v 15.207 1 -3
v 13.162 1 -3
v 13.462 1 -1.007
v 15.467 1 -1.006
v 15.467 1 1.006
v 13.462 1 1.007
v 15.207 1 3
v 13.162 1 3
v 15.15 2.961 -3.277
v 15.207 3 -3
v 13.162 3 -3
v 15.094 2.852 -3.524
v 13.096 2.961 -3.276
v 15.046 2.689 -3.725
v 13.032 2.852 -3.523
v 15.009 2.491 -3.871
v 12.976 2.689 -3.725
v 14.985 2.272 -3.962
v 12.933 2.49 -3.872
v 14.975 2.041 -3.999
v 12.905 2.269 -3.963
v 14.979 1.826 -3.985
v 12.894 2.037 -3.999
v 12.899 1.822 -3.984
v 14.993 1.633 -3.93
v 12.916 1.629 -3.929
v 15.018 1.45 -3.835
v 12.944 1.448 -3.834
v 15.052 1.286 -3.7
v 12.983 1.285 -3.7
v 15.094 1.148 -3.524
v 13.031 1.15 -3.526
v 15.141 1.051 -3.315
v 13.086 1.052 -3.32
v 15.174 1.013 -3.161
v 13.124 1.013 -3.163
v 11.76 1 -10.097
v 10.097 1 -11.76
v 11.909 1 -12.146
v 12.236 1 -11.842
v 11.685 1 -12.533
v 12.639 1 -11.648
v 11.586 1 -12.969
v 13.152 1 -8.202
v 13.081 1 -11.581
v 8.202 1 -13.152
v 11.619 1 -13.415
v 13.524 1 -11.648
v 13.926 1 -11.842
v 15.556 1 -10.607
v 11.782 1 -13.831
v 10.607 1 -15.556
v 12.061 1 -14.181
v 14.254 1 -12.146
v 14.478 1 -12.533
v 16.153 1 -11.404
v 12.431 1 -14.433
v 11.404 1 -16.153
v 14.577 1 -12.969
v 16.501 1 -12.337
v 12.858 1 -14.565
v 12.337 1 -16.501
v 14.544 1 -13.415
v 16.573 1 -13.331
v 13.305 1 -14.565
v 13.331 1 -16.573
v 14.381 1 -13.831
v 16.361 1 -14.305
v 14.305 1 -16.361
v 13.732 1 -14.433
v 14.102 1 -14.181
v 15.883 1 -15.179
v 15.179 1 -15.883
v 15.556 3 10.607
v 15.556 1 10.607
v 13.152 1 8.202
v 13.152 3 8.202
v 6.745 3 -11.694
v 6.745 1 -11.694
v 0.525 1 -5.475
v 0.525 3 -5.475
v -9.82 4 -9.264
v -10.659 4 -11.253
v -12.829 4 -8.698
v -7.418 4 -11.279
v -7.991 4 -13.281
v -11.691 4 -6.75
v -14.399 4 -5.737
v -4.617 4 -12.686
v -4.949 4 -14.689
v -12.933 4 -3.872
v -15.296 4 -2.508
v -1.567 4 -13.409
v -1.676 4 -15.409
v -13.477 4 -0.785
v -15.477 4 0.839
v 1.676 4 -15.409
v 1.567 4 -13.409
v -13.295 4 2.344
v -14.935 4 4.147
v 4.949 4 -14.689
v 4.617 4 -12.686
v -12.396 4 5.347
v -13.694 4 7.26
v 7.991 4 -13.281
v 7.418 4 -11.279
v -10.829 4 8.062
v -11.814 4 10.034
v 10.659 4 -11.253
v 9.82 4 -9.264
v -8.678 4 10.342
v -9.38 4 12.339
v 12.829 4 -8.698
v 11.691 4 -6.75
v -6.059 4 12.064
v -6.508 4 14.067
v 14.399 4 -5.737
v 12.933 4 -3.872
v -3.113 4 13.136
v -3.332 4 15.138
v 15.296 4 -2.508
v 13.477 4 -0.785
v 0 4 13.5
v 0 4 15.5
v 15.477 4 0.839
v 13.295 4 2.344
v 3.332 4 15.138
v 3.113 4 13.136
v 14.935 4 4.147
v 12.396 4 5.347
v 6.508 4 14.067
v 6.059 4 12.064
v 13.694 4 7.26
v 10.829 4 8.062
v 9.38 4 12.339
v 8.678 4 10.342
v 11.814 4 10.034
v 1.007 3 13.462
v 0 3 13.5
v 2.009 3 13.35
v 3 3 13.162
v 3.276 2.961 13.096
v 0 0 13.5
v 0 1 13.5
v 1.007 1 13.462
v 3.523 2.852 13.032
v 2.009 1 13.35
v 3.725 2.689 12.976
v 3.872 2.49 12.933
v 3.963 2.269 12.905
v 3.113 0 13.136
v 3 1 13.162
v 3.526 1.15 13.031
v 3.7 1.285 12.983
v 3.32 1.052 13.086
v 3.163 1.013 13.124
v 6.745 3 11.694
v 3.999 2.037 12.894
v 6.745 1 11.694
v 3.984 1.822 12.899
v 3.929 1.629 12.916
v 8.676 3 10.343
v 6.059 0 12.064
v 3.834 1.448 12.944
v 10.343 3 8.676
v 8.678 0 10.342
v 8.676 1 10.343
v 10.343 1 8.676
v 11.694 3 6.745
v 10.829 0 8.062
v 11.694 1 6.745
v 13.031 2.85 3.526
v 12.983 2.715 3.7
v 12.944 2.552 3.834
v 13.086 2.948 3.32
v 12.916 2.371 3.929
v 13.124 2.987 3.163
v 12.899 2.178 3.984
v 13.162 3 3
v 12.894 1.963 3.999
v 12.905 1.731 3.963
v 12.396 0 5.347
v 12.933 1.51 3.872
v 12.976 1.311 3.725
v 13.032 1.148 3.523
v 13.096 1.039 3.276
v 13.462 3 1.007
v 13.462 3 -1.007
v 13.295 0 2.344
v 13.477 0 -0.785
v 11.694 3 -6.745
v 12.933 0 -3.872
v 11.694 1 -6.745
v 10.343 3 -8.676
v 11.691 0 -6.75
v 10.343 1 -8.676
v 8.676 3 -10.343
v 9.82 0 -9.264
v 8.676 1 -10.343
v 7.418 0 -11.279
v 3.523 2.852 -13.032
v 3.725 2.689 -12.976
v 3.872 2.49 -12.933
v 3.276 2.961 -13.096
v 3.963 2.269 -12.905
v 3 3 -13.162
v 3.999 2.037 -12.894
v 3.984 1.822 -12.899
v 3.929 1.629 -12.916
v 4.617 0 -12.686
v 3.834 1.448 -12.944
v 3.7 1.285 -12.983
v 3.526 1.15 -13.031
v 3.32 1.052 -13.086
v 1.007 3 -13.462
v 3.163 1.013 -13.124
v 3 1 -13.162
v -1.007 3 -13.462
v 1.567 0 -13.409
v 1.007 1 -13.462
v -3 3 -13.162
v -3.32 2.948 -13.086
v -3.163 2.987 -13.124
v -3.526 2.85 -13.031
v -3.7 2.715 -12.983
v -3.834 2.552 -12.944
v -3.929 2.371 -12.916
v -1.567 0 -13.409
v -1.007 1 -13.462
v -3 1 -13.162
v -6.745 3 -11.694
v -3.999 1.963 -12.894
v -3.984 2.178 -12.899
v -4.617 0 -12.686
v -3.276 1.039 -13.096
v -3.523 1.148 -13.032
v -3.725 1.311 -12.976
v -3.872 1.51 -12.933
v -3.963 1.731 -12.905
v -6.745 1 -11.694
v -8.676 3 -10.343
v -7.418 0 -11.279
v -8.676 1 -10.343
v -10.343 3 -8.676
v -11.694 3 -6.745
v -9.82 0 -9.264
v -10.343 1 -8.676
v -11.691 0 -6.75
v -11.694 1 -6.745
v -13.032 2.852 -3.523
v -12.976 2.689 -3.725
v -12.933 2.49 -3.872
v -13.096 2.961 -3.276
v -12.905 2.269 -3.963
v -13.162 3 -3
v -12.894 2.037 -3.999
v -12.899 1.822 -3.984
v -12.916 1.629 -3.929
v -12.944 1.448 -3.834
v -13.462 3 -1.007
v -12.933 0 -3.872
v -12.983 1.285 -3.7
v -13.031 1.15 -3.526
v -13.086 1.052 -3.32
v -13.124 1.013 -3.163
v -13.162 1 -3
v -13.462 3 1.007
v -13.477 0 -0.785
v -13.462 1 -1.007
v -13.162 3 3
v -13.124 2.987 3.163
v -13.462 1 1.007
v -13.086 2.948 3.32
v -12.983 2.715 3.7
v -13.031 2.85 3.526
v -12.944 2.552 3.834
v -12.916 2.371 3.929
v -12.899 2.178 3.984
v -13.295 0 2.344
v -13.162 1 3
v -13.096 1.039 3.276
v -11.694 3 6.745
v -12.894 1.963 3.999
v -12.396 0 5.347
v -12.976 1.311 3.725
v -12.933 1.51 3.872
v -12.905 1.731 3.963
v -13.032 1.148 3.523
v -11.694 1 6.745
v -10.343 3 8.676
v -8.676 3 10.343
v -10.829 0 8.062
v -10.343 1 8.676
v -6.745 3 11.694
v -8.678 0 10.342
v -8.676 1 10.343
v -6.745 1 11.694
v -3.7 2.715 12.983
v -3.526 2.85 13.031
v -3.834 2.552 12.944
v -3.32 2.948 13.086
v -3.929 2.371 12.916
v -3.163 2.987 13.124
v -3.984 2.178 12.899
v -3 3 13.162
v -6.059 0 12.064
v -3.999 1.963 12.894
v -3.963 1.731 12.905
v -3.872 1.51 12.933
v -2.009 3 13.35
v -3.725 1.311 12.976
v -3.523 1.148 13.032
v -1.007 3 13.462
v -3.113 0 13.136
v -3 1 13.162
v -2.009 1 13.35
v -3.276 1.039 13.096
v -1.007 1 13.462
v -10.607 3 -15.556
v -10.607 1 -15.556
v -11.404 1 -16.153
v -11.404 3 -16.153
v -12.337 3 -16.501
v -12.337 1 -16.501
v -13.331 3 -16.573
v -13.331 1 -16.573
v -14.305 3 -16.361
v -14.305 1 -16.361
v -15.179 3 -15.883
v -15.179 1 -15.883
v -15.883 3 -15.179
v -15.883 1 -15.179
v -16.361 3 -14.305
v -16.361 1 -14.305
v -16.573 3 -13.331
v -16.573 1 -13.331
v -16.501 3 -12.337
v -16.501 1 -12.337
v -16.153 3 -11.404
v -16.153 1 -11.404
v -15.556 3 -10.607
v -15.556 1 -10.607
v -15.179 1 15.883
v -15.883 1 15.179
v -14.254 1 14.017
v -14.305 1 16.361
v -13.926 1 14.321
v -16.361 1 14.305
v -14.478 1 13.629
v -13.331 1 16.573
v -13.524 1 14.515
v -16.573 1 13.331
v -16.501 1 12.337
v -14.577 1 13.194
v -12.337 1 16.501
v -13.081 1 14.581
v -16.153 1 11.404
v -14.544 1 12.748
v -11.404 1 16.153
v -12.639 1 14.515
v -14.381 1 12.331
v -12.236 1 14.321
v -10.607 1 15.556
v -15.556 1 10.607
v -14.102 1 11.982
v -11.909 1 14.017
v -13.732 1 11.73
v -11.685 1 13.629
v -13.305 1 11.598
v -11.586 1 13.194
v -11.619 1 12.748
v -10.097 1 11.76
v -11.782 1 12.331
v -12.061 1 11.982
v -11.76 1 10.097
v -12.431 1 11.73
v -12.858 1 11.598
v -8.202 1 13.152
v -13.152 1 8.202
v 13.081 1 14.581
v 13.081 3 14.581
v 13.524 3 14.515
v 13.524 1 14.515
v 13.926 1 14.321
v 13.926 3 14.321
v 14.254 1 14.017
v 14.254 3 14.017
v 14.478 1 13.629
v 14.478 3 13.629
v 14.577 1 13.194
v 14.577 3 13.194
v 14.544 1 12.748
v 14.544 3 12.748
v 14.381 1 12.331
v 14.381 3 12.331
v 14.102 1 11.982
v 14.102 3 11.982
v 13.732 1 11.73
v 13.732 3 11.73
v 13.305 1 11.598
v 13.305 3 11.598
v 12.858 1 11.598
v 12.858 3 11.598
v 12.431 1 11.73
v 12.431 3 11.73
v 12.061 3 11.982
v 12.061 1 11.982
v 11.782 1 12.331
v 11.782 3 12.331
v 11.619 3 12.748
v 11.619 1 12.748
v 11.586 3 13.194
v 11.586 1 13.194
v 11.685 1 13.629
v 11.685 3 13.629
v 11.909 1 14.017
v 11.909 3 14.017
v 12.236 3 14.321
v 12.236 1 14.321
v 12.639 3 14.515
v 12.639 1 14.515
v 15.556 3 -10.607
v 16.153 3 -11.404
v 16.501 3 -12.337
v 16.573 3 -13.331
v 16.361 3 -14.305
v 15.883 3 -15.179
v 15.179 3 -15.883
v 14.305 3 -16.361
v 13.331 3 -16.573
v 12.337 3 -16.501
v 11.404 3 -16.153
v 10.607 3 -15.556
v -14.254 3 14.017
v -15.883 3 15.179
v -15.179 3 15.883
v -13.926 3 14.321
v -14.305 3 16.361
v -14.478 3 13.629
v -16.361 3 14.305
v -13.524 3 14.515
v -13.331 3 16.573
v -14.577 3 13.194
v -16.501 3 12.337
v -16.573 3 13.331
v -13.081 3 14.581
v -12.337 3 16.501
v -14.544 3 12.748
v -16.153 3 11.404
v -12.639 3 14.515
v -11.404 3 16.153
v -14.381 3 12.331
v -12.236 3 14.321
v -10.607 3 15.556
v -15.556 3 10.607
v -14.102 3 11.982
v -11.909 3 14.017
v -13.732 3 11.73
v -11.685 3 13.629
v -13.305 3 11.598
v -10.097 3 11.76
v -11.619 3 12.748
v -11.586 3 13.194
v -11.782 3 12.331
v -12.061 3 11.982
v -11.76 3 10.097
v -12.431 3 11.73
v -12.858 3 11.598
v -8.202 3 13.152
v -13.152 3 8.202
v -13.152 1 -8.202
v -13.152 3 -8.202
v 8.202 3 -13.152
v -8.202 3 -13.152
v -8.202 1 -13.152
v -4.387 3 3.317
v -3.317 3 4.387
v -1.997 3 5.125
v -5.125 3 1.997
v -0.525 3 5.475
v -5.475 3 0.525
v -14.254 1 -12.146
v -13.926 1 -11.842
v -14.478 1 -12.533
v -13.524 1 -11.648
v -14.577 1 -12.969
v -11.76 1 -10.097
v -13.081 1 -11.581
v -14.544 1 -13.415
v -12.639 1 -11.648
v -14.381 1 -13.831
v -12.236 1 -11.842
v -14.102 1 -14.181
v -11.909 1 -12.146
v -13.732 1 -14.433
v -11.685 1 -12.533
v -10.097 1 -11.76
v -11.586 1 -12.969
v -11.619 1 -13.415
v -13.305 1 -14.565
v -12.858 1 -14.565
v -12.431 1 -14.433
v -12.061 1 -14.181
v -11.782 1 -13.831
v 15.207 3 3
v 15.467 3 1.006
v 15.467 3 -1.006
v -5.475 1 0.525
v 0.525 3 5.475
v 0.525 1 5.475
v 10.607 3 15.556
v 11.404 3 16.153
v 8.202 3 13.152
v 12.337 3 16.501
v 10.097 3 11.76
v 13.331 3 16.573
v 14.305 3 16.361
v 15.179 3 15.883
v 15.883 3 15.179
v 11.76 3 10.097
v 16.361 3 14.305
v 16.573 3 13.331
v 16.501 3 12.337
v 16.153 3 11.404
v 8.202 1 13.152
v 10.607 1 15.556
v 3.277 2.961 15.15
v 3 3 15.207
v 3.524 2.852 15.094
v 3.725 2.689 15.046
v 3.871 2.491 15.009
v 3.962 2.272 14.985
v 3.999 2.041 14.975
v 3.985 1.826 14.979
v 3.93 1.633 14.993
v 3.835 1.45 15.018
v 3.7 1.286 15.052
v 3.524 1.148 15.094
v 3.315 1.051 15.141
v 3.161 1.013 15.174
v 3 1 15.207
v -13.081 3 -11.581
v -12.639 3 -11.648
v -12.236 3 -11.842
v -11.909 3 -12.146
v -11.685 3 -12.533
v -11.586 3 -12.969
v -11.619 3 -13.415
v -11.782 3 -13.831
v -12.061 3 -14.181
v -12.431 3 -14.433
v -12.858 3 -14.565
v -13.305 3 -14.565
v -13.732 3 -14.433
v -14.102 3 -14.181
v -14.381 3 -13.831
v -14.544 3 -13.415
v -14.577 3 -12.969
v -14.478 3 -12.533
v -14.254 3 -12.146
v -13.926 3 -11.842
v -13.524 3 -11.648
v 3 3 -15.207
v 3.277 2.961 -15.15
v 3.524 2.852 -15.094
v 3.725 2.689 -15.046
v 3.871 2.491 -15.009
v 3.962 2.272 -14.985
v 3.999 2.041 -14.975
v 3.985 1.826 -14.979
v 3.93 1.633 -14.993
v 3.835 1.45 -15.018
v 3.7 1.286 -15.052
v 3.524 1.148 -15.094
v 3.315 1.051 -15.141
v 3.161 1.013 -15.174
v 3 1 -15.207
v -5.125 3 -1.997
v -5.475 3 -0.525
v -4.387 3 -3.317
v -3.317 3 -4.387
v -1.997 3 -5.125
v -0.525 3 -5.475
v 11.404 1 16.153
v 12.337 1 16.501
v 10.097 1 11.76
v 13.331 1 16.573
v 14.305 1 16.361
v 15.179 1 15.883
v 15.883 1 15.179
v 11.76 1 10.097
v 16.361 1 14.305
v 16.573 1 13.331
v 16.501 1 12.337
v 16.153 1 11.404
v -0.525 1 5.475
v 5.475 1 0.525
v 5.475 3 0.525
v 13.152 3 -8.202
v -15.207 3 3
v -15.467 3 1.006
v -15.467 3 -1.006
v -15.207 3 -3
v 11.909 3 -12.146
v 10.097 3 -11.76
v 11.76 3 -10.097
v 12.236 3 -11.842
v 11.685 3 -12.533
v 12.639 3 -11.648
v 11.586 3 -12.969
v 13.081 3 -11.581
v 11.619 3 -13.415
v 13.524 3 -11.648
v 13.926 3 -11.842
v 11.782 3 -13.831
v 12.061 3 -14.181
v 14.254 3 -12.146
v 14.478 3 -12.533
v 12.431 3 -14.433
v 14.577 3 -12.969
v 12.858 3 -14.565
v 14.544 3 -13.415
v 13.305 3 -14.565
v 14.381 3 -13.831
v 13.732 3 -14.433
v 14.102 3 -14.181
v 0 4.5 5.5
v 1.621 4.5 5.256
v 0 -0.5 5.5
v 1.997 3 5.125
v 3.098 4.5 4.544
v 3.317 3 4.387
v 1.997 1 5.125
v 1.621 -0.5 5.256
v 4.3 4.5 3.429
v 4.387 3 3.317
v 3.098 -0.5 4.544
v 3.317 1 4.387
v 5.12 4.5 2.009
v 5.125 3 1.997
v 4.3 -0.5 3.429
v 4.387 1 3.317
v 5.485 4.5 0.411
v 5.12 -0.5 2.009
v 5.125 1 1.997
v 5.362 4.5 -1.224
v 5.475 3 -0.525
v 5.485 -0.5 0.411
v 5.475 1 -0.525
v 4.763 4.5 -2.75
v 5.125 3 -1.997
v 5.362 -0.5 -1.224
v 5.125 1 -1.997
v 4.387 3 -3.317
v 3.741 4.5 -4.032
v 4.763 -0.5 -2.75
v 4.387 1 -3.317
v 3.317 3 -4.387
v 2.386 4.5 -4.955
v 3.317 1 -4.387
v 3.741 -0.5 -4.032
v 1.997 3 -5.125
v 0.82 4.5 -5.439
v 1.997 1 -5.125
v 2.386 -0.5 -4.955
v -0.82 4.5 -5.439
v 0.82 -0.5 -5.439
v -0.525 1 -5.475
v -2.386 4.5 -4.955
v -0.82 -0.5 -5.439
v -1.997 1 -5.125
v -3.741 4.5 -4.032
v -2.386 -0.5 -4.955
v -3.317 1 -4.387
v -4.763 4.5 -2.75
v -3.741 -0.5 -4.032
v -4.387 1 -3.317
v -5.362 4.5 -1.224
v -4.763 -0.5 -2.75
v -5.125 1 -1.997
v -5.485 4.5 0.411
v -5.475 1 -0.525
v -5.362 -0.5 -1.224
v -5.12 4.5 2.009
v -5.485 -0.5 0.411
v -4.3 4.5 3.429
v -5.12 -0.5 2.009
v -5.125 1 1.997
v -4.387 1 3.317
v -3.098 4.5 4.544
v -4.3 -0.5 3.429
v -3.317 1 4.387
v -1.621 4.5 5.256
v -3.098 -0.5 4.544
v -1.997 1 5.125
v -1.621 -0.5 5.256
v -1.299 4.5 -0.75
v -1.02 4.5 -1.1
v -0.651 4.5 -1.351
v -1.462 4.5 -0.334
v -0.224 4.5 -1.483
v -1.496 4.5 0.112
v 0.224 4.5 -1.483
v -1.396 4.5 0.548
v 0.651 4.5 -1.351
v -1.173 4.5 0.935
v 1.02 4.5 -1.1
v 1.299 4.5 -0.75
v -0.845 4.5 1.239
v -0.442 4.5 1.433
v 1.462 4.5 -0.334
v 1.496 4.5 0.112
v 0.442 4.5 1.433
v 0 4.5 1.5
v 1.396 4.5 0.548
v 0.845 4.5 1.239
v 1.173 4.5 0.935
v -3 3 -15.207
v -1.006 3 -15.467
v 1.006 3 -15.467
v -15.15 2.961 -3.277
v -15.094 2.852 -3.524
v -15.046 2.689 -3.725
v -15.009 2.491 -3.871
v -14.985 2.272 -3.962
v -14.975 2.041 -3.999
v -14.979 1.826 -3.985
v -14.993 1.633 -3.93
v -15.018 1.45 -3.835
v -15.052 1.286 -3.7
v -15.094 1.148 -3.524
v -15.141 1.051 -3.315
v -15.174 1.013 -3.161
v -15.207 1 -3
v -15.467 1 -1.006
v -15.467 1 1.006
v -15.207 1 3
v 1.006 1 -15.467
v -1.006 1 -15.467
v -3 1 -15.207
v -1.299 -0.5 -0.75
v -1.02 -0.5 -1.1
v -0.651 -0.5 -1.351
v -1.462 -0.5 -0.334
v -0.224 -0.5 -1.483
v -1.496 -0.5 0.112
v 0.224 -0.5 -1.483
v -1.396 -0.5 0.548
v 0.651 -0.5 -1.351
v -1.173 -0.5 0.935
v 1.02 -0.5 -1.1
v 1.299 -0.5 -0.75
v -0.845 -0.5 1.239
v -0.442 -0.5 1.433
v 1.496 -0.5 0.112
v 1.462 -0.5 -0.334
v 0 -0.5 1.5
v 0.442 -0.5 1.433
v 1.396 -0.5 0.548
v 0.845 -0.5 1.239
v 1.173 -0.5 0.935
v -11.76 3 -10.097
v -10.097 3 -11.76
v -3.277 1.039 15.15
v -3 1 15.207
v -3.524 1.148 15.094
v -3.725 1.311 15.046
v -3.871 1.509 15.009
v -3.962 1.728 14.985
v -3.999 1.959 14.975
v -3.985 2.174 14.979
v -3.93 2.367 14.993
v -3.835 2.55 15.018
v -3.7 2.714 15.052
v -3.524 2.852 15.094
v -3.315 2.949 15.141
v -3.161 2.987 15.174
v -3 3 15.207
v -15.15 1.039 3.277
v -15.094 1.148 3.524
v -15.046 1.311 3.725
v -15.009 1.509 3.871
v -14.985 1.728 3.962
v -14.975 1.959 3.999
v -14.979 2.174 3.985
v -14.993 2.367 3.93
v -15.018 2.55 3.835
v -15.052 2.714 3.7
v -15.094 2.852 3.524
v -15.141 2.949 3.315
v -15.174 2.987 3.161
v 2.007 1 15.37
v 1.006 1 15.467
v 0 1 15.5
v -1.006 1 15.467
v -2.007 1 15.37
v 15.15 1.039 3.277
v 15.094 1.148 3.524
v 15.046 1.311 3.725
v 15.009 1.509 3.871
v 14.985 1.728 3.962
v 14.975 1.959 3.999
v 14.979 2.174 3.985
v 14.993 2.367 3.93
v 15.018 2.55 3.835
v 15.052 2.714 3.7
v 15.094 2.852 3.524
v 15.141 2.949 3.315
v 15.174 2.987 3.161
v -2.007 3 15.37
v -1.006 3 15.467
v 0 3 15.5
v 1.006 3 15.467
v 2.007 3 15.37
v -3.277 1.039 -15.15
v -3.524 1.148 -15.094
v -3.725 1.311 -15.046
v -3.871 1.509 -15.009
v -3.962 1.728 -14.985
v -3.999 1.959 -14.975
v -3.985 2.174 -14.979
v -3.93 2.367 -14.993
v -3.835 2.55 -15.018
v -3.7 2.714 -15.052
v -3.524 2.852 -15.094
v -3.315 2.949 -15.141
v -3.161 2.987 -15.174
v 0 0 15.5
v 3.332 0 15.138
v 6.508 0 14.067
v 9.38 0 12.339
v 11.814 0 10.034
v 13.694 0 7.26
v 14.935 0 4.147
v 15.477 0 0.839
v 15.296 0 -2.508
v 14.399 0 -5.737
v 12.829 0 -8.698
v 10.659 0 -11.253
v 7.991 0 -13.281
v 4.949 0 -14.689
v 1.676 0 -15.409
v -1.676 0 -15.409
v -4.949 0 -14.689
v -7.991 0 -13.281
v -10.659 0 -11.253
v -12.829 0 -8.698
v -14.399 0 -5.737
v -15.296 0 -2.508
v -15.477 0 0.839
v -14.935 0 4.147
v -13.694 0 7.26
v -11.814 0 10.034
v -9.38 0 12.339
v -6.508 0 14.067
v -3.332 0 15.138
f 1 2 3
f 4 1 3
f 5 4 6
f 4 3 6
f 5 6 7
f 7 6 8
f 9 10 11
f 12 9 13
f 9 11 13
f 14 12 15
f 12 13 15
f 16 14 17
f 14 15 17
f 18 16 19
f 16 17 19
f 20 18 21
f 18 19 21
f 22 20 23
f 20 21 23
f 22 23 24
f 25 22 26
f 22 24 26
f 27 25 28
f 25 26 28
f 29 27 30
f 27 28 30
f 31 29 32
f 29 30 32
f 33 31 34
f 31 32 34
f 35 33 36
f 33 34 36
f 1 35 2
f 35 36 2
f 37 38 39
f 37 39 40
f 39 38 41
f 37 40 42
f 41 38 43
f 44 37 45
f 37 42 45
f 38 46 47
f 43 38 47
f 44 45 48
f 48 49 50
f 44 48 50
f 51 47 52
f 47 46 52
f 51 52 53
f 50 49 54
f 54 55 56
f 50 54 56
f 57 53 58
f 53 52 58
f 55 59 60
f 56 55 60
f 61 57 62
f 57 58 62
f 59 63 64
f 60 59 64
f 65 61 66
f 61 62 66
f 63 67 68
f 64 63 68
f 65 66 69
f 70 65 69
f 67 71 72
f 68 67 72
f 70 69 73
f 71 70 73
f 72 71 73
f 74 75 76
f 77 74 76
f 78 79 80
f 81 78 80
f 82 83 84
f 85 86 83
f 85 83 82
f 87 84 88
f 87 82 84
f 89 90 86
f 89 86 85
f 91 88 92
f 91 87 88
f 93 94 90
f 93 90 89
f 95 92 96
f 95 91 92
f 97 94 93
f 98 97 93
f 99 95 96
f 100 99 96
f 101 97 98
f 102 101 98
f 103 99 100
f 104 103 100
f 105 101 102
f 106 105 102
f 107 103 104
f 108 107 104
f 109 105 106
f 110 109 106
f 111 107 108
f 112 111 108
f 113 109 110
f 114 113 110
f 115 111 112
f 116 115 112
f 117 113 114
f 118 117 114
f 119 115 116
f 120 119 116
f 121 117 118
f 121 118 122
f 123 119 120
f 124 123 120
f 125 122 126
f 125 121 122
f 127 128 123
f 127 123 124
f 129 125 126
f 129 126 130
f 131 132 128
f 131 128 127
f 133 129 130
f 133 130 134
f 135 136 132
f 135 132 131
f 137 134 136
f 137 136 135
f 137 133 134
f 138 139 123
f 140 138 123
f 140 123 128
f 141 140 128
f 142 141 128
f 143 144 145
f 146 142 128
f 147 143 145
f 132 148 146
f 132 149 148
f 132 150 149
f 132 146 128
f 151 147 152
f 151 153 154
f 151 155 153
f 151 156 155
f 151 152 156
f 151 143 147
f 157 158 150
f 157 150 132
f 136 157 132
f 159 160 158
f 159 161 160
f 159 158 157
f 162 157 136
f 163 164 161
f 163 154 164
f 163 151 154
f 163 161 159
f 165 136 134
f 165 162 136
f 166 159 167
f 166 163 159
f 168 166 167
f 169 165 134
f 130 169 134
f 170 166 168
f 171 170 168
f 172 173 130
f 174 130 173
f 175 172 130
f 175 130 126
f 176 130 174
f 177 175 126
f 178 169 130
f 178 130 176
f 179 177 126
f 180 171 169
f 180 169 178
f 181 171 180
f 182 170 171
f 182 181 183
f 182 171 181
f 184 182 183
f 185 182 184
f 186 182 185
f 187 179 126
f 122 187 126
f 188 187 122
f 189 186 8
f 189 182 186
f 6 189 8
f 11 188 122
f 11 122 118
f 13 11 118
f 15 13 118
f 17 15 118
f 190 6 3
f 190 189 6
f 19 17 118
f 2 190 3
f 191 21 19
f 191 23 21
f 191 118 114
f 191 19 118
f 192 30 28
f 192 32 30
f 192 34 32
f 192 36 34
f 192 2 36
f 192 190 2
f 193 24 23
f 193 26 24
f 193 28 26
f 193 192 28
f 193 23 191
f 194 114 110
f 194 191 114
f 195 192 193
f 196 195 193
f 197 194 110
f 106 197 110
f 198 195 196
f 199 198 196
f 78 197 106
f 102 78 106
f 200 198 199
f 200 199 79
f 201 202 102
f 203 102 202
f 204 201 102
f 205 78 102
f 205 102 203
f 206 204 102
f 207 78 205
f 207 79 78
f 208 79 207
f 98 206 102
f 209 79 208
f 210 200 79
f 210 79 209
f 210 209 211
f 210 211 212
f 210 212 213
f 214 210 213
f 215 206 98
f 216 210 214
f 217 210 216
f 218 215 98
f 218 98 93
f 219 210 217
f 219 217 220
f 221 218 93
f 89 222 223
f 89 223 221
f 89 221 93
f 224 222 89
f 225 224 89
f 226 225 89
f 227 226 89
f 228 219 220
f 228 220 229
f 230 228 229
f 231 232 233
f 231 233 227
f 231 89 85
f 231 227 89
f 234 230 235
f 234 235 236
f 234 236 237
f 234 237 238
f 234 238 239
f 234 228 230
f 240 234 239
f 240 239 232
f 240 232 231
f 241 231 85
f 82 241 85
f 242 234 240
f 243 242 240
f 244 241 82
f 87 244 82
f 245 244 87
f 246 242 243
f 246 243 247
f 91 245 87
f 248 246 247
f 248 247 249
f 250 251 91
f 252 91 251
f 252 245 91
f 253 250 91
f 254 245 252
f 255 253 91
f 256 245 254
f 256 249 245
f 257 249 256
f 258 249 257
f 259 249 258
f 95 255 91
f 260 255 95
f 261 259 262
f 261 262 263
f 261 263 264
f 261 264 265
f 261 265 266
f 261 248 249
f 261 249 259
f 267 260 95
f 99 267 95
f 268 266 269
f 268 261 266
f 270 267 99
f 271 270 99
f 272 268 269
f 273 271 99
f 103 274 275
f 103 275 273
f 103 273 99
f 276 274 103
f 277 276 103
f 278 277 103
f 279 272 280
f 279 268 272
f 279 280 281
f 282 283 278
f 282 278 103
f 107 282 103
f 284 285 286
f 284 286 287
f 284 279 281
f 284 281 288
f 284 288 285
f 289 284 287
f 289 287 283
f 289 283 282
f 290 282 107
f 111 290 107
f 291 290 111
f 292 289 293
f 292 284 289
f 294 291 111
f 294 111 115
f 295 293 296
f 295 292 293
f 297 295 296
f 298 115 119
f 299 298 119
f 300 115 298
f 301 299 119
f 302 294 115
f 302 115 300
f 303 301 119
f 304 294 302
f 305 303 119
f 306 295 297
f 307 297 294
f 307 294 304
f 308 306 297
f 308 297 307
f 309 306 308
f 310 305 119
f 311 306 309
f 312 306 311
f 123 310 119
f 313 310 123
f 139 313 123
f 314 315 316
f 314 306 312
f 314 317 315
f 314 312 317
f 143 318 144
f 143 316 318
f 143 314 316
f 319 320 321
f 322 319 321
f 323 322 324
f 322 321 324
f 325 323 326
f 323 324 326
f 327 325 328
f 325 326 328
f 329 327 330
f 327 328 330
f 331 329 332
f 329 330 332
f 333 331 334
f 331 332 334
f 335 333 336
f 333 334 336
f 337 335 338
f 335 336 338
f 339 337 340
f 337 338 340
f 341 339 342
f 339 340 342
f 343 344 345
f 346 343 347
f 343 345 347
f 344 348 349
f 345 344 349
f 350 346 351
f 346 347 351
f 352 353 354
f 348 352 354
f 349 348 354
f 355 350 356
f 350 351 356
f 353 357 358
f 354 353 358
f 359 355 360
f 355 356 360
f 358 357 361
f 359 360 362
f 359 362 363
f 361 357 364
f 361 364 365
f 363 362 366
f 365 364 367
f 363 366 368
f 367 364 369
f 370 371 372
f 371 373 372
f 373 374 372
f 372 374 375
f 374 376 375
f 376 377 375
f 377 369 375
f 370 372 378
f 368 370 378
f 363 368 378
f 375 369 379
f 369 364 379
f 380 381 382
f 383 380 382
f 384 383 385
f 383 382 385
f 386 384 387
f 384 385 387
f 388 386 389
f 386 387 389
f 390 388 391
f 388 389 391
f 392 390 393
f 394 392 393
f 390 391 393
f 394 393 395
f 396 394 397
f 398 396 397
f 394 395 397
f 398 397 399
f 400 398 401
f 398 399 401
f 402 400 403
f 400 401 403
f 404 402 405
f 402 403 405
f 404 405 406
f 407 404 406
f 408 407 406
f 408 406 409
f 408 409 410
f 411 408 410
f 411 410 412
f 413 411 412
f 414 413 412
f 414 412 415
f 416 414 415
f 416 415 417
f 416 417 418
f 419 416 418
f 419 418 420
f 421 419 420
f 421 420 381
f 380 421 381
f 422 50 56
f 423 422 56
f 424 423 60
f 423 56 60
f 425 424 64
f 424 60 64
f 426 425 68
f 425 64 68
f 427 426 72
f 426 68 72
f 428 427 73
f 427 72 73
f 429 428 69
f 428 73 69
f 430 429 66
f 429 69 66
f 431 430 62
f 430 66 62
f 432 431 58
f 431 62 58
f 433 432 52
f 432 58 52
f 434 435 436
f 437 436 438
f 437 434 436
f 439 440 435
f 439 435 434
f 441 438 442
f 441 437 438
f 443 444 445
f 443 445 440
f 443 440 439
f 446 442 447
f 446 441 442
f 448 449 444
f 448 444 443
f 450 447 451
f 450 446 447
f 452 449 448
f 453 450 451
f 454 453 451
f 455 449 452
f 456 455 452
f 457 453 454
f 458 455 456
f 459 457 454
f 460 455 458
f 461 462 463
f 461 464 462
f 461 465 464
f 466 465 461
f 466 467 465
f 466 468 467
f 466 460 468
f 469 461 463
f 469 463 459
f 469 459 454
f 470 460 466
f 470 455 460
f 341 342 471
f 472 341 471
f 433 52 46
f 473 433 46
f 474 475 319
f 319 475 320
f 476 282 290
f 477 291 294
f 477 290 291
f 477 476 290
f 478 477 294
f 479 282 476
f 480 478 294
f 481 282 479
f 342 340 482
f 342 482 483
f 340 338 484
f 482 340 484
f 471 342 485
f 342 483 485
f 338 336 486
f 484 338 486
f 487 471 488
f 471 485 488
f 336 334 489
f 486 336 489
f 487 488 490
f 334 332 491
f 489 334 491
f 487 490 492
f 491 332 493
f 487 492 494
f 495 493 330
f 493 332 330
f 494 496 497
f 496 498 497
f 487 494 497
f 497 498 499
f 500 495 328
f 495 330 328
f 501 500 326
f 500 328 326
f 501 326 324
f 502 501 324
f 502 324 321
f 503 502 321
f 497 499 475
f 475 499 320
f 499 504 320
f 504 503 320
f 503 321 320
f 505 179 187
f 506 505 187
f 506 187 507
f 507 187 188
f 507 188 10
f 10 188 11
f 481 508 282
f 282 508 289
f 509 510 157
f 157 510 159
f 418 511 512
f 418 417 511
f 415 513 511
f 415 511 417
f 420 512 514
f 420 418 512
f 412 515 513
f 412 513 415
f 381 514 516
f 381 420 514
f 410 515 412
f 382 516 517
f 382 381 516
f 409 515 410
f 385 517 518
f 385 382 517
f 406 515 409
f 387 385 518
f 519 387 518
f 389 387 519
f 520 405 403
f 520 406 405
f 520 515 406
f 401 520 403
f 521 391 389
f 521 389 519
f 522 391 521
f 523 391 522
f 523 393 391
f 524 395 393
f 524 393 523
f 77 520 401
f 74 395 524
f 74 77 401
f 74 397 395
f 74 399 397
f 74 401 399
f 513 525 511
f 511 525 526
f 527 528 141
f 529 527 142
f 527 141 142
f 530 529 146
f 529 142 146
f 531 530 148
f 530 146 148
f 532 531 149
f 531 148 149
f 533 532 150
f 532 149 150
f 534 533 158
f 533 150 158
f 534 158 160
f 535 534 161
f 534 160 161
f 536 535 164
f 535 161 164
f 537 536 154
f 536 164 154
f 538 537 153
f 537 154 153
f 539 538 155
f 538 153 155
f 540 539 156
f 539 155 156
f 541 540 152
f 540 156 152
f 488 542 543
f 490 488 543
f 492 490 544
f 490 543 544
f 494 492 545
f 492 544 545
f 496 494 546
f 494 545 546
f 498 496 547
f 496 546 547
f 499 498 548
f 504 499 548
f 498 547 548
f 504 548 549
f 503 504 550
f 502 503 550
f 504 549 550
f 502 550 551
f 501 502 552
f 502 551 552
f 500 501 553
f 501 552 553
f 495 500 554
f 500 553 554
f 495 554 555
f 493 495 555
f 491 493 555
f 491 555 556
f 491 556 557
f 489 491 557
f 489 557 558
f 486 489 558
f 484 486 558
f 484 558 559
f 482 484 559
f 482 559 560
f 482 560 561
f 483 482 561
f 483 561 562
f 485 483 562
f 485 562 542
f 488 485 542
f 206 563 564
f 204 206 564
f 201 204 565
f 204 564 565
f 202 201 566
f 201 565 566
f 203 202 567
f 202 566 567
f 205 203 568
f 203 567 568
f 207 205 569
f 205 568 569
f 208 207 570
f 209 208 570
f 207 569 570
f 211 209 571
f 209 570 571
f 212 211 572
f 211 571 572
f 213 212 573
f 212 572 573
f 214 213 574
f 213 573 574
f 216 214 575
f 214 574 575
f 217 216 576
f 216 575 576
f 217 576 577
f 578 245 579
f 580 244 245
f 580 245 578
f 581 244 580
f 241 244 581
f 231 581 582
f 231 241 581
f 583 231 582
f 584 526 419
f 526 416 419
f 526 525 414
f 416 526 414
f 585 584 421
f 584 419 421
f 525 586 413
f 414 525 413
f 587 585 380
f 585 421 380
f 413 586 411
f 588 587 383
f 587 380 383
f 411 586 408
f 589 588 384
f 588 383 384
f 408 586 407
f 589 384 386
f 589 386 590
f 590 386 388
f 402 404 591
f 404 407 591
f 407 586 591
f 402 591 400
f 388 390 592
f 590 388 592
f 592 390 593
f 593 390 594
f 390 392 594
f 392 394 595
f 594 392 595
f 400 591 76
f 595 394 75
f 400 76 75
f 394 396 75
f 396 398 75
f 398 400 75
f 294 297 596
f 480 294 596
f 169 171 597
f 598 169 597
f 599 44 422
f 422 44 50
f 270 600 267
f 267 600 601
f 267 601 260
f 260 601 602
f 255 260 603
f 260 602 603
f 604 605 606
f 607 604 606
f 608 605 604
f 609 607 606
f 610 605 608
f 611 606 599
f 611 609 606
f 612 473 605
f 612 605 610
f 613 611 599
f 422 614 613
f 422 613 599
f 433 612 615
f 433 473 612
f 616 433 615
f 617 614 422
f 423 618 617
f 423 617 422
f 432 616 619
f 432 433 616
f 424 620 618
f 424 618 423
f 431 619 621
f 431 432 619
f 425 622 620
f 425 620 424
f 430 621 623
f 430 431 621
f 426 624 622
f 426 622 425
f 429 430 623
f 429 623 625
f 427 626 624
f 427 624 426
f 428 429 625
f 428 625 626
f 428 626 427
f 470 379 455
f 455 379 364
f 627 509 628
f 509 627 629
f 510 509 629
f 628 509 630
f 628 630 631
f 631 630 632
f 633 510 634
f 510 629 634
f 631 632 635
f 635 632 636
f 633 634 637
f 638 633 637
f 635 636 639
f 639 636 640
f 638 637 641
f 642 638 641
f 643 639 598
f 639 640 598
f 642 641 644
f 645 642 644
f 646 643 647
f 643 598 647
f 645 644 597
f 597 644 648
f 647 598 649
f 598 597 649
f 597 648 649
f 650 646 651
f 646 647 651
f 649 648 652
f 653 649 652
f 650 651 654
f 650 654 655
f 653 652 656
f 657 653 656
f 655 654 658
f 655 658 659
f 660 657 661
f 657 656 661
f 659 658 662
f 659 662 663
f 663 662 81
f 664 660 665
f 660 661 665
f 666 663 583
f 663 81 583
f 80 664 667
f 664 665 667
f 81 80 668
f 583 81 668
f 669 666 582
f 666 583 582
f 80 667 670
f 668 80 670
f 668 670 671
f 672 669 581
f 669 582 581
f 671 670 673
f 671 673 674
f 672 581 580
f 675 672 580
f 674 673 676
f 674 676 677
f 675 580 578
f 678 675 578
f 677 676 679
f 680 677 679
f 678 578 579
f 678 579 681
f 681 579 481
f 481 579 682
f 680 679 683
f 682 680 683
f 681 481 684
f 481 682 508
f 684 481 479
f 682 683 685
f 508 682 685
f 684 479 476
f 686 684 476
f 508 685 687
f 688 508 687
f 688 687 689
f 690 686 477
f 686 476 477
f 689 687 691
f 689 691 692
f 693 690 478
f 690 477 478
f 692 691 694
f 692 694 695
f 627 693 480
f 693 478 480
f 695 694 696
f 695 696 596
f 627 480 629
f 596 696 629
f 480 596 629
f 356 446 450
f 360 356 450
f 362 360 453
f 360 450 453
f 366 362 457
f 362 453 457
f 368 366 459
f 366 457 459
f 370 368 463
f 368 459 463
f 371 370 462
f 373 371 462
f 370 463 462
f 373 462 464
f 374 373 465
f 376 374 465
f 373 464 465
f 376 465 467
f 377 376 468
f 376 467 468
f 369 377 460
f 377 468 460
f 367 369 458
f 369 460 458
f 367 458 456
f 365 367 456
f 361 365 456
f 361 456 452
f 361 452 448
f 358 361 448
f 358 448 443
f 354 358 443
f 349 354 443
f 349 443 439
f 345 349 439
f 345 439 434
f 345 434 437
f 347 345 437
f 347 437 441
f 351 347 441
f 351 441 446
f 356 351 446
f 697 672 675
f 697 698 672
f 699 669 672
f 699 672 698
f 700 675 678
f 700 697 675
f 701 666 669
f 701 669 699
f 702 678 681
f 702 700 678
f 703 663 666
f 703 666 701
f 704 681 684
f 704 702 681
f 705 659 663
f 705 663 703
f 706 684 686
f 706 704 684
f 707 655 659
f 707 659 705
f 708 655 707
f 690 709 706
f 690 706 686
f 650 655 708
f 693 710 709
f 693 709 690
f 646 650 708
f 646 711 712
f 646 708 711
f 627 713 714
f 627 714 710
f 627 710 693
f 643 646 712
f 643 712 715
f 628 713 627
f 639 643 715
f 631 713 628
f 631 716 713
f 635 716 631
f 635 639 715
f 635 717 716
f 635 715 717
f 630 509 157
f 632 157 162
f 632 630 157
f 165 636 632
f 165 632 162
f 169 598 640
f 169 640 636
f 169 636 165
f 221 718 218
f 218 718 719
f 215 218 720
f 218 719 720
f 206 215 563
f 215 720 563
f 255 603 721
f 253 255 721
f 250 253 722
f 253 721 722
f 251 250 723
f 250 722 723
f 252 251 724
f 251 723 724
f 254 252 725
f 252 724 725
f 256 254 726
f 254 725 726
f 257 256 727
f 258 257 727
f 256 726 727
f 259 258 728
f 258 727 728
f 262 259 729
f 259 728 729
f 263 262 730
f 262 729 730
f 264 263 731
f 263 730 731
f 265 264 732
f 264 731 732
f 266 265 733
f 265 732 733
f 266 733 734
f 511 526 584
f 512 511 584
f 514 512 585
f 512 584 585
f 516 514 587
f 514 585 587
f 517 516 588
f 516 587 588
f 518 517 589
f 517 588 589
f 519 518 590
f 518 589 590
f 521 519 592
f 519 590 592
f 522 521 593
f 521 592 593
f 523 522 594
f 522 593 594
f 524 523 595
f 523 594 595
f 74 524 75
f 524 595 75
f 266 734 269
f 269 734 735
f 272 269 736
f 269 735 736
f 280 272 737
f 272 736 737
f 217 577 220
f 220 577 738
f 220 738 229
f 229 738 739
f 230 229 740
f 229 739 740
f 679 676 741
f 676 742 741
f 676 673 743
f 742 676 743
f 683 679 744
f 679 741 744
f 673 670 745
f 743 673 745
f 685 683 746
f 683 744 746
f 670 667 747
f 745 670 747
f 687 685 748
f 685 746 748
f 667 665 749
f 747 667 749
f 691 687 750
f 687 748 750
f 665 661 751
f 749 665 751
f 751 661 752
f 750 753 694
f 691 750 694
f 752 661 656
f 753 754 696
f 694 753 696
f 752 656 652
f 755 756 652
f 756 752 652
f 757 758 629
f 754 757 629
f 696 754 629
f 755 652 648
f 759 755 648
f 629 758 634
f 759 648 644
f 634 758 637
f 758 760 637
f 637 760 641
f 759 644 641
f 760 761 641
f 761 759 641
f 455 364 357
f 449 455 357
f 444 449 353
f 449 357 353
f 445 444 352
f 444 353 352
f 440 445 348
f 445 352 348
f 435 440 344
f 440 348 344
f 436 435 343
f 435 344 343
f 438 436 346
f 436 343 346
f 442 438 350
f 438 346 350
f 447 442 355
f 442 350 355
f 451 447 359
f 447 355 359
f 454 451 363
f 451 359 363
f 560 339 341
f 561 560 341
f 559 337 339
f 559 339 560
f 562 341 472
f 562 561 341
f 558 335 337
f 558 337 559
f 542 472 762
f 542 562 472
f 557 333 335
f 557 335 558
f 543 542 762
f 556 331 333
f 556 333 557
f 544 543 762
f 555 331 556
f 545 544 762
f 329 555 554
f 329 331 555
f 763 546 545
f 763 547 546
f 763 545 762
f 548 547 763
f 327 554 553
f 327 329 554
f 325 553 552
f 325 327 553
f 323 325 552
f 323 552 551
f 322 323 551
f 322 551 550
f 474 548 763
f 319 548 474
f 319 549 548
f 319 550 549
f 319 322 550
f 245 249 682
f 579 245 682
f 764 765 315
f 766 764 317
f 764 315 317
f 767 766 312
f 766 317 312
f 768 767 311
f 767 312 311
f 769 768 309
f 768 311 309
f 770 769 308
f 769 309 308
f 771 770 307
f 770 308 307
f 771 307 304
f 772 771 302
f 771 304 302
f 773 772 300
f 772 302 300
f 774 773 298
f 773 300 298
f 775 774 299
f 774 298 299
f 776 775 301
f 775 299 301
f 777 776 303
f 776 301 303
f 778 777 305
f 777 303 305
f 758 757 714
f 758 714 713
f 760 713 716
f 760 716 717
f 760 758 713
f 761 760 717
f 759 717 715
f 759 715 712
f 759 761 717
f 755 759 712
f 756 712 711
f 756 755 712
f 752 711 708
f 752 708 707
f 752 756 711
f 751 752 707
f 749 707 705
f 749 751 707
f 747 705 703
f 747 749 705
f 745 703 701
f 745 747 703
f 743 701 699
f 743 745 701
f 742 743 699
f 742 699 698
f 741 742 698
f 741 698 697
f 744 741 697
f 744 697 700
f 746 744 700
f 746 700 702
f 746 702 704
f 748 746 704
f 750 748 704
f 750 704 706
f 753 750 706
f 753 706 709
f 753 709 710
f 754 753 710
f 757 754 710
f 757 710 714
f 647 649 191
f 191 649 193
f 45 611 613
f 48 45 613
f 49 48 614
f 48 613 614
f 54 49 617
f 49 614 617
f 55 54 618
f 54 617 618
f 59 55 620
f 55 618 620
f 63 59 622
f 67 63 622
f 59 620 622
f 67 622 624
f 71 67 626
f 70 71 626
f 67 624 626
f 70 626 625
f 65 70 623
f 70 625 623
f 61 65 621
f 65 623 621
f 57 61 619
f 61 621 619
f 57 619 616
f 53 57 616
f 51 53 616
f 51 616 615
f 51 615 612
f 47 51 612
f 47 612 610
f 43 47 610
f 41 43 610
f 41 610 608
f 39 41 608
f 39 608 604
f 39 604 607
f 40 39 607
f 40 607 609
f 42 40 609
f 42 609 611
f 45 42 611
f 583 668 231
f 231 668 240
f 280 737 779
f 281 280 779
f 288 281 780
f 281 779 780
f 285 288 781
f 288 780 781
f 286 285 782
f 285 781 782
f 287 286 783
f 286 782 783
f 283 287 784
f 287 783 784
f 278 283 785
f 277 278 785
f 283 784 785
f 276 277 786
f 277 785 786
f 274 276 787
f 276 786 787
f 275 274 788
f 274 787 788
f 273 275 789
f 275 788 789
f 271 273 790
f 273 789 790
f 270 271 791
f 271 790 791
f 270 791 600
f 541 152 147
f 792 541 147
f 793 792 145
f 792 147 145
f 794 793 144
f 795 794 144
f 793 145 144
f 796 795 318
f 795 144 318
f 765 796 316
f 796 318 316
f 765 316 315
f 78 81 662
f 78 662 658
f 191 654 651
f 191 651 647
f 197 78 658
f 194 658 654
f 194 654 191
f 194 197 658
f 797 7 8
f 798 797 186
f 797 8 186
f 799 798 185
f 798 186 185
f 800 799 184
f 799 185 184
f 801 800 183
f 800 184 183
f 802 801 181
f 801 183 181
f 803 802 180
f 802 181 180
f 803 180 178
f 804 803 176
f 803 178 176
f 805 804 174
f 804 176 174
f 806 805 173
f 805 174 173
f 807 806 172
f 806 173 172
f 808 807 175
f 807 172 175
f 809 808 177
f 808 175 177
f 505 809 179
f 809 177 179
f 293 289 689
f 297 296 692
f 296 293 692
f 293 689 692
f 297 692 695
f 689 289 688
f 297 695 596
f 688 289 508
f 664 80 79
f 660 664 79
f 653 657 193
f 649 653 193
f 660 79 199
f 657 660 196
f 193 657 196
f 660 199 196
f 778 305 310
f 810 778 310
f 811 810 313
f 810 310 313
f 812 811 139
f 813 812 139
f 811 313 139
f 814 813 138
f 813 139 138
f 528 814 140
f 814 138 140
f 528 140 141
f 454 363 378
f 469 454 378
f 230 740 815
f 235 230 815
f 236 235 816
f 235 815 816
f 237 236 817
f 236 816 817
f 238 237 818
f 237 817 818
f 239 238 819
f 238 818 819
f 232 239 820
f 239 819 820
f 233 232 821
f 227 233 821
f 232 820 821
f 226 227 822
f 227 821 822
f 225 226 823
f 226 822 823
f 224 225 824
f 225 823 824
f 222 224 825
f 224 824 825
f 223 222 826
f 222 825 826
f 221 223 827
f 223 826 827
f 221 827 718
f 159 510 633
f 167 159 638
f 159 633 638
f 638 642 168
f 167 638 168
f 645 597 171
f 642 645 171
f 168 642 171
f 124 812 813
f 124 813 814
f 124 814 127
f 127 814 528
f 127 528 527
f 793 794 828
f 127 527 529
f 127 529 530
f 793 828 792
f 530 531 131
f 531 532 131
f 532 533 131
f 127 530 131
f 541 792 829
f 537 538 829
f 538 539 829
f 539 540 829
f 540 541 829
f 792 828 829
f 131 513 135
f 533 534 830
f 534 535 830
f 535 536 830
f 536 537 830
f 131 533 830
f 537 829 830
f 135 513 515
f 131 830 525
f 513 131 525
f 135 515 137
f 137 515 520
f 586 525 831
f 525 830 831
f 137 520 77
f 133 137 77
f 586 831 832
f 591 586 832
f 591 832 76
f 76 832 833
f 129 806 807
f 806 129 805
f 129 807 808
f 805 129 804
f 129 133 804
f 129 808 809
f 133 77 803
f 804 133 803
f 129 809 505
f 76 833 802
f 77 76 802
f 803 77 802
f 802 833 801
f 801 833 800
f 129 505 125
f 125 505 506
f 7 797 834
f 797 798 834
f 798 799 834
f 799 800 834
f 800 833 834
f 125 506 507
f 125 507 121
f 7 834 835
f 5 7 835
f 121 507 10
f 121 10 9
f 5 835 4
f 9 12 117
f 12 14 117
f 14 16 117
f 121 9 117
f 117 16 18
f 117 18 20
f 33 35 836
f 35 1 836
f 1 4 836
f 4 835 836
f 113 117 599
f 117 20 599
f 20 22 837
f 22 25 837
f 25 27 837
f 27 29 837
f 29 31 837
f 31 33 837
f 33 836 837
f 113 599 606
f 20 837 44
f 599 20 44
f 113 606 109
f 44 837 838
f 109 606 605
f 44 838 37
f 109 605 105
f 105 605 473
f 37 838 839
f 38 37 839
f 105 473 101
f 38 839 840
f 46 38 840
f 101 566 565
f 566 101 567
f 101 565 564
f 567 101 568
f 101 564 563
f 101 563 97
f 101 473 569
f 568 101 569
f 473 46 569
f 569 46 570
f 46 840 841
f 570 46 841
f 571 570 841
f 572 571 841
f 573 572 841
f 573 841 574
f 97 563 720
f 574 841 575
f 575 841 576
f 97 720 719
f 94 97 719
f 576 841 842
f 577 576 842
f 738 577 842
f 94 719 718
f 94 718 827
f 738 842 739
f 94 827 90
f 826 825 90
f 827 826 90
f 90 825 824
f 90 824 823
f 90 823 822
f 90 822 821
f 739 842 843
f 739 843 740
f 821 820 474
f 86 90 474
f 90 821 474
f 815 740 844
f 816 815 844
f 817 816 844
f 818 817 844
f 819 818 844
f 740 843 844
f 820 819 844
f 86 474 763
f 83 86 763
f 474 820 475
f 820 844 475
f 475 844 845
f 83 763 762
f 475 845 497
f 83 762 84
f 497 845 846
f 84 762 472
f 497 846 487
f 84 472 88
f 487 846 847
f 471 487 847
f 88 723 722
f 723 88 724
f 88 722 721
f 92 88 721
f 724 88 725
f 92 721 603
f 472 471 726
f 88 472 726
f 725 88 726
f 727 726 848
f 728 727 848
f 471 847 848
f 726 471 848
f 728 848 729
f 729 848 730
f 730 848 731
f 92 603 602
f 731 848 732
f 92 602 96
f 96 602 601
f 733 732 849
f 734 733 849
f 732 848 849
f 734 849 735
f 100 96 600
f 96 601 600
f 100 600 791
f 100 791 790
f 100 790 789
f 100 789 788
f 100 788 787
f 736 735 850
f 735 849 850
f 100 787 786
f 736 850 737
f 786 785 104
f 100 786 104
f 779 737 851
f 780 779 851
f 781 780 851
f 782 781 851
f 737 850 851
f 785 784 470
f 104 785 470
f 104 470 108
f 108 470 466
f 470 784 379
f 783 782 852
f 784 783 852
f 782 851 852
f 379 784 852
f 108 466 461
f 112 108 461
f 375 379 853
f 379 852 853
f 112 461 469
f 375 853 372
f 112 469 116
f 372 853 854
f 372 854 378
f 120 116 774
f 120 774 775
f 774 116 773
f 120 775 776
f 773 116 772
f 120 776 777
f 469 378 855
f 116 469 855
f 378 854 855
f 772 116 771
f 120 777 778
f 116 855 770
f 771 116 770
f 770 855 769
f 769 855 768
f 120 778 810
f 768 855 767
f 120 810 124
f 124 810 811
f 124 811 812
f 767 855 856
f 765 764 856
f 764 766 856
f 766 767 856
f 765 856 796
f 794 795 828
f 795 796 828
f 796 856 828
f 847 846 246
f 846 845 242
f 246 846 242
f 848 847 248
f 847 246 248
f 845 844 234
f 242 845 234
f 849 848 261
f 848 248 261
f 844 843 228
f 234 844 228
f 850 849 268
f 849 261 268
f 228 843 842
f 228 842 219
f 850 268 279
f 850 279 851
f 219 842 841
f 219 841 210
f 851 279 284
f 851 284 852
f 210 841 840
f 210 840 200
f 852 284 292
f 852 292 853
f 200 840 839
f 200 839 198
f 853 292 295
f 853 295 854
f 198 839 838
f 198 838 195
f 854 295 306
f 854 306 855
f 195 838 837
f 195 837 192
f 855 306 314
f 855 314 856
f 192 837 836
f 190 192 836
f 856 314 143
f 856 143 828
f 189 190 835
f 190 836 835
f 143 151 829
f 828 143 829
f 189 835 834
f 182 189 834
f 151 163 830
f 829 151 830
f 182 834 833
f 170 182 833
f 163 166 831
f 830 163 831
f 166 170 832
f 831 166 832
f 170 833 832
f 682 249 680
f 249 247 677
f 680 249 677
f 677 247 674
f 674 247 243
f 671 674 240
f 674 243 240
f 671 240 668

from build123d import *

# Parameters (mm, degrees)
SKETCH1_R                = 15.5
SKETCH1_R_2              = 13.5
BOSS_EXTRUDE1_DEPTH      = 4
CUT_EXTRUDE1_DEPTH       = 44
CUT_EXTRUDE1_DEPTH_BACK  = 44
CUT_EXTRUDE2_DEPTH       = 44
CUT_EXTRUDE2_DEPTH_BACK  = 44
BOSS_EXTRUDE2_DEPTH      = 1
BOSS_EXTRUDE2_DEPTH_BACK = 1
SKETCH5_R                = 1.5
CUT_EXTRUDE3_DEPTH       = 3
BOSS_EXTRUDE3_DEPTH      = 1.5
BOSS_EXTRUDE3_DEPTH_BACK = 3.5
SKETCH6_R                = 5.5
SKETCH6_R_2              = 1.5
SKETCH7_R                = 1.5
CUT_EXTRUDE4_DEPTH       = 11.5


with BuildPart() as part:
    # Sketch1 → Boss-Extrude1 (new body)
    with BuildSketch(Plane(origin=(0, 0, 0), x_dir=(1, 0, 0), z_dir=(0, 1, 0))):
        Circle(SKETCH1_R)
        Circle(SKETCH1_R_2, mode=Mode.SUBTRACT)
    extrude(amount=BOSS_EXTRUDE1_DEPTH)

    # Sketch2 → Cut-Extrude1 (cut, two sides: drawn at the far end of the back side and taken through both)
    with BuildSketch(Plane.XY.offset(-CUT_EXTRUDE1_DEPTH_BACK)):
        with BuildLine():
            Line((-3, 3), (3, 3))
            ThreePointArc((3, 3), (4, 2), (3, 1))
            Line((3, 1), (-3, 1))
            ThreePointArc((-3, 1), (-4, 2), (-3, 3))
        make_face()
    extrude(amount=CUT_EXTRUDE1_DEPTH + CUT_EXTRUDE1_DEPTH_BACK, mode=Mode.SUBTRACT)

    # Sketch3 → Cut-Extrude2 (cut, two sides: drawn at the far end of the back side and taken through both)
    with BuildSketch(Plane(origin=(0, 0, 0), x_dir=(0, 0, -1), z_dir=(1, 0, 0)).offset(-CUT_EXTRUDE2_DEPTH_BACK)):
        with BuildLine():
            Line((-3, 3), (3, 3))
            ThreePointArc((3, 3), (4, 2), (3, 1))
            Line((3, 1), (-3, 1))
            ThreePointArc((-3, 1), (-4, 2), (-3, 3))
        make_face()
    extrude(amount=CUT_EXTRUDE2_DEPTH + CUT_EXTRUDE2_DEPTH_BACK, mode=Mode.SUBTRACT)

    # Sketch4 → Boss-Extrude2 (add, two sides: drawn at the far end of the back side and taken through both)
    with BuildSketch(Plane(origin=(0, 2, 0), x_dir=(1, 0, 0), z_dir=(0, 1, 0)).offset(-BOSS_EXTRUDE2_DEPTH_BACK)):
        with BuildLine():
            Line((0, 4.949747468), (-10.606601718, 15.556349186))
            ThreePointArc((-10.606601718, 15.556349186), (-15.556349186, 15.556349186), (-15.556349186, 10.606601718))
            Line((-15.556349186, 10.606601718), (-4.949747468, 0))
            Line((-4.949747468, 0), (-15.556349186, -10.606601718))
            ThreePointArc((-15.556349186, -10.606601718), (-15.556349186, -15.556349186), (-10.606601718, -15.556349186))
            Line((-10.606601718, -15.556349186), (0, -4.949747468))
            Line((0, -4.949747468), (10.606601718, -15.556349186))
            ThreePointArc((10.606601718, -15.556349186), (15.556349186, -15.556349186), (15.556349186, -10.606601718))
            Line((15.556349186, -10.606601718), (4.949747468, 0))
            Line((4.949747468, 0), (15.556349186, 10.606601718))
            ThreePointArc((15.556349186, 10.606601718), (15.556349186, 15.556349186), (10.606601718, 15.556349186))
            Line((10.606601718, 15.556349186), (0, 4.949747468))
        make_face()
    extrude(amount=BOSS_EXTRUDE2_DEPTH + BOSS_EXTRUDE2_DEPTH_BACK)

    # Sketch5 → Cut-Extrude3 (cut)
    with BuildSketch(Plane(origin=(0, 3, 0), x_dir=(1, 0, 0), z_dir=(0, 1, 0))):
        Circle(SKETCH5_R)
    extrude(amount=-CUT_EXTRUDE3_DEPTH, mode=Mode.SUBTRACT)

    # Sketch6 → Boss-Extrude3 (add, two sides: drawn at the far end of the back side and taken through both)
    with BuildSketch(Plane(origin=(0, 3, 0), x_dir=(1, 0, 0), z_dir=(0, 1, 0)).offset(-BOSS_EXTRUDE3_DEPTH_BACK)):
        Circle(SKETCH6_R)
        Circle(SKETCH6_R_2, mode=Mode.SUBTRACT)
    extrude(amount=BOSS_EXTRUDE3_DEPTH + BOSS_EXTRUDE3_DEPTH_BACK)

    # Sketch7 → Cut-Extrude4 (cut)
    with BuildSketch(Plane(origin=(0, 3, 0), x_dir=(1, 0, 0), z_dir=(0, 1, 0))):
        with Locations((-13.081475452, 13.081475452)):
            Circle(SKETCH7_R)
        with Locations((13.081475452, 13.081475452)):
            Circle(SKETCH7_R)
        with Locations((13.081475452, -13.081475452)):
            Circle(SKETCH7_R)
        with Locations((-13.081475452, -13.081475452)):
            Circle(SKETCH7_R)
    extrude(amount=-CUT_EXTRUDE4_DEPTH, mode=Mode.SUBTRACT)


solid = part.part
